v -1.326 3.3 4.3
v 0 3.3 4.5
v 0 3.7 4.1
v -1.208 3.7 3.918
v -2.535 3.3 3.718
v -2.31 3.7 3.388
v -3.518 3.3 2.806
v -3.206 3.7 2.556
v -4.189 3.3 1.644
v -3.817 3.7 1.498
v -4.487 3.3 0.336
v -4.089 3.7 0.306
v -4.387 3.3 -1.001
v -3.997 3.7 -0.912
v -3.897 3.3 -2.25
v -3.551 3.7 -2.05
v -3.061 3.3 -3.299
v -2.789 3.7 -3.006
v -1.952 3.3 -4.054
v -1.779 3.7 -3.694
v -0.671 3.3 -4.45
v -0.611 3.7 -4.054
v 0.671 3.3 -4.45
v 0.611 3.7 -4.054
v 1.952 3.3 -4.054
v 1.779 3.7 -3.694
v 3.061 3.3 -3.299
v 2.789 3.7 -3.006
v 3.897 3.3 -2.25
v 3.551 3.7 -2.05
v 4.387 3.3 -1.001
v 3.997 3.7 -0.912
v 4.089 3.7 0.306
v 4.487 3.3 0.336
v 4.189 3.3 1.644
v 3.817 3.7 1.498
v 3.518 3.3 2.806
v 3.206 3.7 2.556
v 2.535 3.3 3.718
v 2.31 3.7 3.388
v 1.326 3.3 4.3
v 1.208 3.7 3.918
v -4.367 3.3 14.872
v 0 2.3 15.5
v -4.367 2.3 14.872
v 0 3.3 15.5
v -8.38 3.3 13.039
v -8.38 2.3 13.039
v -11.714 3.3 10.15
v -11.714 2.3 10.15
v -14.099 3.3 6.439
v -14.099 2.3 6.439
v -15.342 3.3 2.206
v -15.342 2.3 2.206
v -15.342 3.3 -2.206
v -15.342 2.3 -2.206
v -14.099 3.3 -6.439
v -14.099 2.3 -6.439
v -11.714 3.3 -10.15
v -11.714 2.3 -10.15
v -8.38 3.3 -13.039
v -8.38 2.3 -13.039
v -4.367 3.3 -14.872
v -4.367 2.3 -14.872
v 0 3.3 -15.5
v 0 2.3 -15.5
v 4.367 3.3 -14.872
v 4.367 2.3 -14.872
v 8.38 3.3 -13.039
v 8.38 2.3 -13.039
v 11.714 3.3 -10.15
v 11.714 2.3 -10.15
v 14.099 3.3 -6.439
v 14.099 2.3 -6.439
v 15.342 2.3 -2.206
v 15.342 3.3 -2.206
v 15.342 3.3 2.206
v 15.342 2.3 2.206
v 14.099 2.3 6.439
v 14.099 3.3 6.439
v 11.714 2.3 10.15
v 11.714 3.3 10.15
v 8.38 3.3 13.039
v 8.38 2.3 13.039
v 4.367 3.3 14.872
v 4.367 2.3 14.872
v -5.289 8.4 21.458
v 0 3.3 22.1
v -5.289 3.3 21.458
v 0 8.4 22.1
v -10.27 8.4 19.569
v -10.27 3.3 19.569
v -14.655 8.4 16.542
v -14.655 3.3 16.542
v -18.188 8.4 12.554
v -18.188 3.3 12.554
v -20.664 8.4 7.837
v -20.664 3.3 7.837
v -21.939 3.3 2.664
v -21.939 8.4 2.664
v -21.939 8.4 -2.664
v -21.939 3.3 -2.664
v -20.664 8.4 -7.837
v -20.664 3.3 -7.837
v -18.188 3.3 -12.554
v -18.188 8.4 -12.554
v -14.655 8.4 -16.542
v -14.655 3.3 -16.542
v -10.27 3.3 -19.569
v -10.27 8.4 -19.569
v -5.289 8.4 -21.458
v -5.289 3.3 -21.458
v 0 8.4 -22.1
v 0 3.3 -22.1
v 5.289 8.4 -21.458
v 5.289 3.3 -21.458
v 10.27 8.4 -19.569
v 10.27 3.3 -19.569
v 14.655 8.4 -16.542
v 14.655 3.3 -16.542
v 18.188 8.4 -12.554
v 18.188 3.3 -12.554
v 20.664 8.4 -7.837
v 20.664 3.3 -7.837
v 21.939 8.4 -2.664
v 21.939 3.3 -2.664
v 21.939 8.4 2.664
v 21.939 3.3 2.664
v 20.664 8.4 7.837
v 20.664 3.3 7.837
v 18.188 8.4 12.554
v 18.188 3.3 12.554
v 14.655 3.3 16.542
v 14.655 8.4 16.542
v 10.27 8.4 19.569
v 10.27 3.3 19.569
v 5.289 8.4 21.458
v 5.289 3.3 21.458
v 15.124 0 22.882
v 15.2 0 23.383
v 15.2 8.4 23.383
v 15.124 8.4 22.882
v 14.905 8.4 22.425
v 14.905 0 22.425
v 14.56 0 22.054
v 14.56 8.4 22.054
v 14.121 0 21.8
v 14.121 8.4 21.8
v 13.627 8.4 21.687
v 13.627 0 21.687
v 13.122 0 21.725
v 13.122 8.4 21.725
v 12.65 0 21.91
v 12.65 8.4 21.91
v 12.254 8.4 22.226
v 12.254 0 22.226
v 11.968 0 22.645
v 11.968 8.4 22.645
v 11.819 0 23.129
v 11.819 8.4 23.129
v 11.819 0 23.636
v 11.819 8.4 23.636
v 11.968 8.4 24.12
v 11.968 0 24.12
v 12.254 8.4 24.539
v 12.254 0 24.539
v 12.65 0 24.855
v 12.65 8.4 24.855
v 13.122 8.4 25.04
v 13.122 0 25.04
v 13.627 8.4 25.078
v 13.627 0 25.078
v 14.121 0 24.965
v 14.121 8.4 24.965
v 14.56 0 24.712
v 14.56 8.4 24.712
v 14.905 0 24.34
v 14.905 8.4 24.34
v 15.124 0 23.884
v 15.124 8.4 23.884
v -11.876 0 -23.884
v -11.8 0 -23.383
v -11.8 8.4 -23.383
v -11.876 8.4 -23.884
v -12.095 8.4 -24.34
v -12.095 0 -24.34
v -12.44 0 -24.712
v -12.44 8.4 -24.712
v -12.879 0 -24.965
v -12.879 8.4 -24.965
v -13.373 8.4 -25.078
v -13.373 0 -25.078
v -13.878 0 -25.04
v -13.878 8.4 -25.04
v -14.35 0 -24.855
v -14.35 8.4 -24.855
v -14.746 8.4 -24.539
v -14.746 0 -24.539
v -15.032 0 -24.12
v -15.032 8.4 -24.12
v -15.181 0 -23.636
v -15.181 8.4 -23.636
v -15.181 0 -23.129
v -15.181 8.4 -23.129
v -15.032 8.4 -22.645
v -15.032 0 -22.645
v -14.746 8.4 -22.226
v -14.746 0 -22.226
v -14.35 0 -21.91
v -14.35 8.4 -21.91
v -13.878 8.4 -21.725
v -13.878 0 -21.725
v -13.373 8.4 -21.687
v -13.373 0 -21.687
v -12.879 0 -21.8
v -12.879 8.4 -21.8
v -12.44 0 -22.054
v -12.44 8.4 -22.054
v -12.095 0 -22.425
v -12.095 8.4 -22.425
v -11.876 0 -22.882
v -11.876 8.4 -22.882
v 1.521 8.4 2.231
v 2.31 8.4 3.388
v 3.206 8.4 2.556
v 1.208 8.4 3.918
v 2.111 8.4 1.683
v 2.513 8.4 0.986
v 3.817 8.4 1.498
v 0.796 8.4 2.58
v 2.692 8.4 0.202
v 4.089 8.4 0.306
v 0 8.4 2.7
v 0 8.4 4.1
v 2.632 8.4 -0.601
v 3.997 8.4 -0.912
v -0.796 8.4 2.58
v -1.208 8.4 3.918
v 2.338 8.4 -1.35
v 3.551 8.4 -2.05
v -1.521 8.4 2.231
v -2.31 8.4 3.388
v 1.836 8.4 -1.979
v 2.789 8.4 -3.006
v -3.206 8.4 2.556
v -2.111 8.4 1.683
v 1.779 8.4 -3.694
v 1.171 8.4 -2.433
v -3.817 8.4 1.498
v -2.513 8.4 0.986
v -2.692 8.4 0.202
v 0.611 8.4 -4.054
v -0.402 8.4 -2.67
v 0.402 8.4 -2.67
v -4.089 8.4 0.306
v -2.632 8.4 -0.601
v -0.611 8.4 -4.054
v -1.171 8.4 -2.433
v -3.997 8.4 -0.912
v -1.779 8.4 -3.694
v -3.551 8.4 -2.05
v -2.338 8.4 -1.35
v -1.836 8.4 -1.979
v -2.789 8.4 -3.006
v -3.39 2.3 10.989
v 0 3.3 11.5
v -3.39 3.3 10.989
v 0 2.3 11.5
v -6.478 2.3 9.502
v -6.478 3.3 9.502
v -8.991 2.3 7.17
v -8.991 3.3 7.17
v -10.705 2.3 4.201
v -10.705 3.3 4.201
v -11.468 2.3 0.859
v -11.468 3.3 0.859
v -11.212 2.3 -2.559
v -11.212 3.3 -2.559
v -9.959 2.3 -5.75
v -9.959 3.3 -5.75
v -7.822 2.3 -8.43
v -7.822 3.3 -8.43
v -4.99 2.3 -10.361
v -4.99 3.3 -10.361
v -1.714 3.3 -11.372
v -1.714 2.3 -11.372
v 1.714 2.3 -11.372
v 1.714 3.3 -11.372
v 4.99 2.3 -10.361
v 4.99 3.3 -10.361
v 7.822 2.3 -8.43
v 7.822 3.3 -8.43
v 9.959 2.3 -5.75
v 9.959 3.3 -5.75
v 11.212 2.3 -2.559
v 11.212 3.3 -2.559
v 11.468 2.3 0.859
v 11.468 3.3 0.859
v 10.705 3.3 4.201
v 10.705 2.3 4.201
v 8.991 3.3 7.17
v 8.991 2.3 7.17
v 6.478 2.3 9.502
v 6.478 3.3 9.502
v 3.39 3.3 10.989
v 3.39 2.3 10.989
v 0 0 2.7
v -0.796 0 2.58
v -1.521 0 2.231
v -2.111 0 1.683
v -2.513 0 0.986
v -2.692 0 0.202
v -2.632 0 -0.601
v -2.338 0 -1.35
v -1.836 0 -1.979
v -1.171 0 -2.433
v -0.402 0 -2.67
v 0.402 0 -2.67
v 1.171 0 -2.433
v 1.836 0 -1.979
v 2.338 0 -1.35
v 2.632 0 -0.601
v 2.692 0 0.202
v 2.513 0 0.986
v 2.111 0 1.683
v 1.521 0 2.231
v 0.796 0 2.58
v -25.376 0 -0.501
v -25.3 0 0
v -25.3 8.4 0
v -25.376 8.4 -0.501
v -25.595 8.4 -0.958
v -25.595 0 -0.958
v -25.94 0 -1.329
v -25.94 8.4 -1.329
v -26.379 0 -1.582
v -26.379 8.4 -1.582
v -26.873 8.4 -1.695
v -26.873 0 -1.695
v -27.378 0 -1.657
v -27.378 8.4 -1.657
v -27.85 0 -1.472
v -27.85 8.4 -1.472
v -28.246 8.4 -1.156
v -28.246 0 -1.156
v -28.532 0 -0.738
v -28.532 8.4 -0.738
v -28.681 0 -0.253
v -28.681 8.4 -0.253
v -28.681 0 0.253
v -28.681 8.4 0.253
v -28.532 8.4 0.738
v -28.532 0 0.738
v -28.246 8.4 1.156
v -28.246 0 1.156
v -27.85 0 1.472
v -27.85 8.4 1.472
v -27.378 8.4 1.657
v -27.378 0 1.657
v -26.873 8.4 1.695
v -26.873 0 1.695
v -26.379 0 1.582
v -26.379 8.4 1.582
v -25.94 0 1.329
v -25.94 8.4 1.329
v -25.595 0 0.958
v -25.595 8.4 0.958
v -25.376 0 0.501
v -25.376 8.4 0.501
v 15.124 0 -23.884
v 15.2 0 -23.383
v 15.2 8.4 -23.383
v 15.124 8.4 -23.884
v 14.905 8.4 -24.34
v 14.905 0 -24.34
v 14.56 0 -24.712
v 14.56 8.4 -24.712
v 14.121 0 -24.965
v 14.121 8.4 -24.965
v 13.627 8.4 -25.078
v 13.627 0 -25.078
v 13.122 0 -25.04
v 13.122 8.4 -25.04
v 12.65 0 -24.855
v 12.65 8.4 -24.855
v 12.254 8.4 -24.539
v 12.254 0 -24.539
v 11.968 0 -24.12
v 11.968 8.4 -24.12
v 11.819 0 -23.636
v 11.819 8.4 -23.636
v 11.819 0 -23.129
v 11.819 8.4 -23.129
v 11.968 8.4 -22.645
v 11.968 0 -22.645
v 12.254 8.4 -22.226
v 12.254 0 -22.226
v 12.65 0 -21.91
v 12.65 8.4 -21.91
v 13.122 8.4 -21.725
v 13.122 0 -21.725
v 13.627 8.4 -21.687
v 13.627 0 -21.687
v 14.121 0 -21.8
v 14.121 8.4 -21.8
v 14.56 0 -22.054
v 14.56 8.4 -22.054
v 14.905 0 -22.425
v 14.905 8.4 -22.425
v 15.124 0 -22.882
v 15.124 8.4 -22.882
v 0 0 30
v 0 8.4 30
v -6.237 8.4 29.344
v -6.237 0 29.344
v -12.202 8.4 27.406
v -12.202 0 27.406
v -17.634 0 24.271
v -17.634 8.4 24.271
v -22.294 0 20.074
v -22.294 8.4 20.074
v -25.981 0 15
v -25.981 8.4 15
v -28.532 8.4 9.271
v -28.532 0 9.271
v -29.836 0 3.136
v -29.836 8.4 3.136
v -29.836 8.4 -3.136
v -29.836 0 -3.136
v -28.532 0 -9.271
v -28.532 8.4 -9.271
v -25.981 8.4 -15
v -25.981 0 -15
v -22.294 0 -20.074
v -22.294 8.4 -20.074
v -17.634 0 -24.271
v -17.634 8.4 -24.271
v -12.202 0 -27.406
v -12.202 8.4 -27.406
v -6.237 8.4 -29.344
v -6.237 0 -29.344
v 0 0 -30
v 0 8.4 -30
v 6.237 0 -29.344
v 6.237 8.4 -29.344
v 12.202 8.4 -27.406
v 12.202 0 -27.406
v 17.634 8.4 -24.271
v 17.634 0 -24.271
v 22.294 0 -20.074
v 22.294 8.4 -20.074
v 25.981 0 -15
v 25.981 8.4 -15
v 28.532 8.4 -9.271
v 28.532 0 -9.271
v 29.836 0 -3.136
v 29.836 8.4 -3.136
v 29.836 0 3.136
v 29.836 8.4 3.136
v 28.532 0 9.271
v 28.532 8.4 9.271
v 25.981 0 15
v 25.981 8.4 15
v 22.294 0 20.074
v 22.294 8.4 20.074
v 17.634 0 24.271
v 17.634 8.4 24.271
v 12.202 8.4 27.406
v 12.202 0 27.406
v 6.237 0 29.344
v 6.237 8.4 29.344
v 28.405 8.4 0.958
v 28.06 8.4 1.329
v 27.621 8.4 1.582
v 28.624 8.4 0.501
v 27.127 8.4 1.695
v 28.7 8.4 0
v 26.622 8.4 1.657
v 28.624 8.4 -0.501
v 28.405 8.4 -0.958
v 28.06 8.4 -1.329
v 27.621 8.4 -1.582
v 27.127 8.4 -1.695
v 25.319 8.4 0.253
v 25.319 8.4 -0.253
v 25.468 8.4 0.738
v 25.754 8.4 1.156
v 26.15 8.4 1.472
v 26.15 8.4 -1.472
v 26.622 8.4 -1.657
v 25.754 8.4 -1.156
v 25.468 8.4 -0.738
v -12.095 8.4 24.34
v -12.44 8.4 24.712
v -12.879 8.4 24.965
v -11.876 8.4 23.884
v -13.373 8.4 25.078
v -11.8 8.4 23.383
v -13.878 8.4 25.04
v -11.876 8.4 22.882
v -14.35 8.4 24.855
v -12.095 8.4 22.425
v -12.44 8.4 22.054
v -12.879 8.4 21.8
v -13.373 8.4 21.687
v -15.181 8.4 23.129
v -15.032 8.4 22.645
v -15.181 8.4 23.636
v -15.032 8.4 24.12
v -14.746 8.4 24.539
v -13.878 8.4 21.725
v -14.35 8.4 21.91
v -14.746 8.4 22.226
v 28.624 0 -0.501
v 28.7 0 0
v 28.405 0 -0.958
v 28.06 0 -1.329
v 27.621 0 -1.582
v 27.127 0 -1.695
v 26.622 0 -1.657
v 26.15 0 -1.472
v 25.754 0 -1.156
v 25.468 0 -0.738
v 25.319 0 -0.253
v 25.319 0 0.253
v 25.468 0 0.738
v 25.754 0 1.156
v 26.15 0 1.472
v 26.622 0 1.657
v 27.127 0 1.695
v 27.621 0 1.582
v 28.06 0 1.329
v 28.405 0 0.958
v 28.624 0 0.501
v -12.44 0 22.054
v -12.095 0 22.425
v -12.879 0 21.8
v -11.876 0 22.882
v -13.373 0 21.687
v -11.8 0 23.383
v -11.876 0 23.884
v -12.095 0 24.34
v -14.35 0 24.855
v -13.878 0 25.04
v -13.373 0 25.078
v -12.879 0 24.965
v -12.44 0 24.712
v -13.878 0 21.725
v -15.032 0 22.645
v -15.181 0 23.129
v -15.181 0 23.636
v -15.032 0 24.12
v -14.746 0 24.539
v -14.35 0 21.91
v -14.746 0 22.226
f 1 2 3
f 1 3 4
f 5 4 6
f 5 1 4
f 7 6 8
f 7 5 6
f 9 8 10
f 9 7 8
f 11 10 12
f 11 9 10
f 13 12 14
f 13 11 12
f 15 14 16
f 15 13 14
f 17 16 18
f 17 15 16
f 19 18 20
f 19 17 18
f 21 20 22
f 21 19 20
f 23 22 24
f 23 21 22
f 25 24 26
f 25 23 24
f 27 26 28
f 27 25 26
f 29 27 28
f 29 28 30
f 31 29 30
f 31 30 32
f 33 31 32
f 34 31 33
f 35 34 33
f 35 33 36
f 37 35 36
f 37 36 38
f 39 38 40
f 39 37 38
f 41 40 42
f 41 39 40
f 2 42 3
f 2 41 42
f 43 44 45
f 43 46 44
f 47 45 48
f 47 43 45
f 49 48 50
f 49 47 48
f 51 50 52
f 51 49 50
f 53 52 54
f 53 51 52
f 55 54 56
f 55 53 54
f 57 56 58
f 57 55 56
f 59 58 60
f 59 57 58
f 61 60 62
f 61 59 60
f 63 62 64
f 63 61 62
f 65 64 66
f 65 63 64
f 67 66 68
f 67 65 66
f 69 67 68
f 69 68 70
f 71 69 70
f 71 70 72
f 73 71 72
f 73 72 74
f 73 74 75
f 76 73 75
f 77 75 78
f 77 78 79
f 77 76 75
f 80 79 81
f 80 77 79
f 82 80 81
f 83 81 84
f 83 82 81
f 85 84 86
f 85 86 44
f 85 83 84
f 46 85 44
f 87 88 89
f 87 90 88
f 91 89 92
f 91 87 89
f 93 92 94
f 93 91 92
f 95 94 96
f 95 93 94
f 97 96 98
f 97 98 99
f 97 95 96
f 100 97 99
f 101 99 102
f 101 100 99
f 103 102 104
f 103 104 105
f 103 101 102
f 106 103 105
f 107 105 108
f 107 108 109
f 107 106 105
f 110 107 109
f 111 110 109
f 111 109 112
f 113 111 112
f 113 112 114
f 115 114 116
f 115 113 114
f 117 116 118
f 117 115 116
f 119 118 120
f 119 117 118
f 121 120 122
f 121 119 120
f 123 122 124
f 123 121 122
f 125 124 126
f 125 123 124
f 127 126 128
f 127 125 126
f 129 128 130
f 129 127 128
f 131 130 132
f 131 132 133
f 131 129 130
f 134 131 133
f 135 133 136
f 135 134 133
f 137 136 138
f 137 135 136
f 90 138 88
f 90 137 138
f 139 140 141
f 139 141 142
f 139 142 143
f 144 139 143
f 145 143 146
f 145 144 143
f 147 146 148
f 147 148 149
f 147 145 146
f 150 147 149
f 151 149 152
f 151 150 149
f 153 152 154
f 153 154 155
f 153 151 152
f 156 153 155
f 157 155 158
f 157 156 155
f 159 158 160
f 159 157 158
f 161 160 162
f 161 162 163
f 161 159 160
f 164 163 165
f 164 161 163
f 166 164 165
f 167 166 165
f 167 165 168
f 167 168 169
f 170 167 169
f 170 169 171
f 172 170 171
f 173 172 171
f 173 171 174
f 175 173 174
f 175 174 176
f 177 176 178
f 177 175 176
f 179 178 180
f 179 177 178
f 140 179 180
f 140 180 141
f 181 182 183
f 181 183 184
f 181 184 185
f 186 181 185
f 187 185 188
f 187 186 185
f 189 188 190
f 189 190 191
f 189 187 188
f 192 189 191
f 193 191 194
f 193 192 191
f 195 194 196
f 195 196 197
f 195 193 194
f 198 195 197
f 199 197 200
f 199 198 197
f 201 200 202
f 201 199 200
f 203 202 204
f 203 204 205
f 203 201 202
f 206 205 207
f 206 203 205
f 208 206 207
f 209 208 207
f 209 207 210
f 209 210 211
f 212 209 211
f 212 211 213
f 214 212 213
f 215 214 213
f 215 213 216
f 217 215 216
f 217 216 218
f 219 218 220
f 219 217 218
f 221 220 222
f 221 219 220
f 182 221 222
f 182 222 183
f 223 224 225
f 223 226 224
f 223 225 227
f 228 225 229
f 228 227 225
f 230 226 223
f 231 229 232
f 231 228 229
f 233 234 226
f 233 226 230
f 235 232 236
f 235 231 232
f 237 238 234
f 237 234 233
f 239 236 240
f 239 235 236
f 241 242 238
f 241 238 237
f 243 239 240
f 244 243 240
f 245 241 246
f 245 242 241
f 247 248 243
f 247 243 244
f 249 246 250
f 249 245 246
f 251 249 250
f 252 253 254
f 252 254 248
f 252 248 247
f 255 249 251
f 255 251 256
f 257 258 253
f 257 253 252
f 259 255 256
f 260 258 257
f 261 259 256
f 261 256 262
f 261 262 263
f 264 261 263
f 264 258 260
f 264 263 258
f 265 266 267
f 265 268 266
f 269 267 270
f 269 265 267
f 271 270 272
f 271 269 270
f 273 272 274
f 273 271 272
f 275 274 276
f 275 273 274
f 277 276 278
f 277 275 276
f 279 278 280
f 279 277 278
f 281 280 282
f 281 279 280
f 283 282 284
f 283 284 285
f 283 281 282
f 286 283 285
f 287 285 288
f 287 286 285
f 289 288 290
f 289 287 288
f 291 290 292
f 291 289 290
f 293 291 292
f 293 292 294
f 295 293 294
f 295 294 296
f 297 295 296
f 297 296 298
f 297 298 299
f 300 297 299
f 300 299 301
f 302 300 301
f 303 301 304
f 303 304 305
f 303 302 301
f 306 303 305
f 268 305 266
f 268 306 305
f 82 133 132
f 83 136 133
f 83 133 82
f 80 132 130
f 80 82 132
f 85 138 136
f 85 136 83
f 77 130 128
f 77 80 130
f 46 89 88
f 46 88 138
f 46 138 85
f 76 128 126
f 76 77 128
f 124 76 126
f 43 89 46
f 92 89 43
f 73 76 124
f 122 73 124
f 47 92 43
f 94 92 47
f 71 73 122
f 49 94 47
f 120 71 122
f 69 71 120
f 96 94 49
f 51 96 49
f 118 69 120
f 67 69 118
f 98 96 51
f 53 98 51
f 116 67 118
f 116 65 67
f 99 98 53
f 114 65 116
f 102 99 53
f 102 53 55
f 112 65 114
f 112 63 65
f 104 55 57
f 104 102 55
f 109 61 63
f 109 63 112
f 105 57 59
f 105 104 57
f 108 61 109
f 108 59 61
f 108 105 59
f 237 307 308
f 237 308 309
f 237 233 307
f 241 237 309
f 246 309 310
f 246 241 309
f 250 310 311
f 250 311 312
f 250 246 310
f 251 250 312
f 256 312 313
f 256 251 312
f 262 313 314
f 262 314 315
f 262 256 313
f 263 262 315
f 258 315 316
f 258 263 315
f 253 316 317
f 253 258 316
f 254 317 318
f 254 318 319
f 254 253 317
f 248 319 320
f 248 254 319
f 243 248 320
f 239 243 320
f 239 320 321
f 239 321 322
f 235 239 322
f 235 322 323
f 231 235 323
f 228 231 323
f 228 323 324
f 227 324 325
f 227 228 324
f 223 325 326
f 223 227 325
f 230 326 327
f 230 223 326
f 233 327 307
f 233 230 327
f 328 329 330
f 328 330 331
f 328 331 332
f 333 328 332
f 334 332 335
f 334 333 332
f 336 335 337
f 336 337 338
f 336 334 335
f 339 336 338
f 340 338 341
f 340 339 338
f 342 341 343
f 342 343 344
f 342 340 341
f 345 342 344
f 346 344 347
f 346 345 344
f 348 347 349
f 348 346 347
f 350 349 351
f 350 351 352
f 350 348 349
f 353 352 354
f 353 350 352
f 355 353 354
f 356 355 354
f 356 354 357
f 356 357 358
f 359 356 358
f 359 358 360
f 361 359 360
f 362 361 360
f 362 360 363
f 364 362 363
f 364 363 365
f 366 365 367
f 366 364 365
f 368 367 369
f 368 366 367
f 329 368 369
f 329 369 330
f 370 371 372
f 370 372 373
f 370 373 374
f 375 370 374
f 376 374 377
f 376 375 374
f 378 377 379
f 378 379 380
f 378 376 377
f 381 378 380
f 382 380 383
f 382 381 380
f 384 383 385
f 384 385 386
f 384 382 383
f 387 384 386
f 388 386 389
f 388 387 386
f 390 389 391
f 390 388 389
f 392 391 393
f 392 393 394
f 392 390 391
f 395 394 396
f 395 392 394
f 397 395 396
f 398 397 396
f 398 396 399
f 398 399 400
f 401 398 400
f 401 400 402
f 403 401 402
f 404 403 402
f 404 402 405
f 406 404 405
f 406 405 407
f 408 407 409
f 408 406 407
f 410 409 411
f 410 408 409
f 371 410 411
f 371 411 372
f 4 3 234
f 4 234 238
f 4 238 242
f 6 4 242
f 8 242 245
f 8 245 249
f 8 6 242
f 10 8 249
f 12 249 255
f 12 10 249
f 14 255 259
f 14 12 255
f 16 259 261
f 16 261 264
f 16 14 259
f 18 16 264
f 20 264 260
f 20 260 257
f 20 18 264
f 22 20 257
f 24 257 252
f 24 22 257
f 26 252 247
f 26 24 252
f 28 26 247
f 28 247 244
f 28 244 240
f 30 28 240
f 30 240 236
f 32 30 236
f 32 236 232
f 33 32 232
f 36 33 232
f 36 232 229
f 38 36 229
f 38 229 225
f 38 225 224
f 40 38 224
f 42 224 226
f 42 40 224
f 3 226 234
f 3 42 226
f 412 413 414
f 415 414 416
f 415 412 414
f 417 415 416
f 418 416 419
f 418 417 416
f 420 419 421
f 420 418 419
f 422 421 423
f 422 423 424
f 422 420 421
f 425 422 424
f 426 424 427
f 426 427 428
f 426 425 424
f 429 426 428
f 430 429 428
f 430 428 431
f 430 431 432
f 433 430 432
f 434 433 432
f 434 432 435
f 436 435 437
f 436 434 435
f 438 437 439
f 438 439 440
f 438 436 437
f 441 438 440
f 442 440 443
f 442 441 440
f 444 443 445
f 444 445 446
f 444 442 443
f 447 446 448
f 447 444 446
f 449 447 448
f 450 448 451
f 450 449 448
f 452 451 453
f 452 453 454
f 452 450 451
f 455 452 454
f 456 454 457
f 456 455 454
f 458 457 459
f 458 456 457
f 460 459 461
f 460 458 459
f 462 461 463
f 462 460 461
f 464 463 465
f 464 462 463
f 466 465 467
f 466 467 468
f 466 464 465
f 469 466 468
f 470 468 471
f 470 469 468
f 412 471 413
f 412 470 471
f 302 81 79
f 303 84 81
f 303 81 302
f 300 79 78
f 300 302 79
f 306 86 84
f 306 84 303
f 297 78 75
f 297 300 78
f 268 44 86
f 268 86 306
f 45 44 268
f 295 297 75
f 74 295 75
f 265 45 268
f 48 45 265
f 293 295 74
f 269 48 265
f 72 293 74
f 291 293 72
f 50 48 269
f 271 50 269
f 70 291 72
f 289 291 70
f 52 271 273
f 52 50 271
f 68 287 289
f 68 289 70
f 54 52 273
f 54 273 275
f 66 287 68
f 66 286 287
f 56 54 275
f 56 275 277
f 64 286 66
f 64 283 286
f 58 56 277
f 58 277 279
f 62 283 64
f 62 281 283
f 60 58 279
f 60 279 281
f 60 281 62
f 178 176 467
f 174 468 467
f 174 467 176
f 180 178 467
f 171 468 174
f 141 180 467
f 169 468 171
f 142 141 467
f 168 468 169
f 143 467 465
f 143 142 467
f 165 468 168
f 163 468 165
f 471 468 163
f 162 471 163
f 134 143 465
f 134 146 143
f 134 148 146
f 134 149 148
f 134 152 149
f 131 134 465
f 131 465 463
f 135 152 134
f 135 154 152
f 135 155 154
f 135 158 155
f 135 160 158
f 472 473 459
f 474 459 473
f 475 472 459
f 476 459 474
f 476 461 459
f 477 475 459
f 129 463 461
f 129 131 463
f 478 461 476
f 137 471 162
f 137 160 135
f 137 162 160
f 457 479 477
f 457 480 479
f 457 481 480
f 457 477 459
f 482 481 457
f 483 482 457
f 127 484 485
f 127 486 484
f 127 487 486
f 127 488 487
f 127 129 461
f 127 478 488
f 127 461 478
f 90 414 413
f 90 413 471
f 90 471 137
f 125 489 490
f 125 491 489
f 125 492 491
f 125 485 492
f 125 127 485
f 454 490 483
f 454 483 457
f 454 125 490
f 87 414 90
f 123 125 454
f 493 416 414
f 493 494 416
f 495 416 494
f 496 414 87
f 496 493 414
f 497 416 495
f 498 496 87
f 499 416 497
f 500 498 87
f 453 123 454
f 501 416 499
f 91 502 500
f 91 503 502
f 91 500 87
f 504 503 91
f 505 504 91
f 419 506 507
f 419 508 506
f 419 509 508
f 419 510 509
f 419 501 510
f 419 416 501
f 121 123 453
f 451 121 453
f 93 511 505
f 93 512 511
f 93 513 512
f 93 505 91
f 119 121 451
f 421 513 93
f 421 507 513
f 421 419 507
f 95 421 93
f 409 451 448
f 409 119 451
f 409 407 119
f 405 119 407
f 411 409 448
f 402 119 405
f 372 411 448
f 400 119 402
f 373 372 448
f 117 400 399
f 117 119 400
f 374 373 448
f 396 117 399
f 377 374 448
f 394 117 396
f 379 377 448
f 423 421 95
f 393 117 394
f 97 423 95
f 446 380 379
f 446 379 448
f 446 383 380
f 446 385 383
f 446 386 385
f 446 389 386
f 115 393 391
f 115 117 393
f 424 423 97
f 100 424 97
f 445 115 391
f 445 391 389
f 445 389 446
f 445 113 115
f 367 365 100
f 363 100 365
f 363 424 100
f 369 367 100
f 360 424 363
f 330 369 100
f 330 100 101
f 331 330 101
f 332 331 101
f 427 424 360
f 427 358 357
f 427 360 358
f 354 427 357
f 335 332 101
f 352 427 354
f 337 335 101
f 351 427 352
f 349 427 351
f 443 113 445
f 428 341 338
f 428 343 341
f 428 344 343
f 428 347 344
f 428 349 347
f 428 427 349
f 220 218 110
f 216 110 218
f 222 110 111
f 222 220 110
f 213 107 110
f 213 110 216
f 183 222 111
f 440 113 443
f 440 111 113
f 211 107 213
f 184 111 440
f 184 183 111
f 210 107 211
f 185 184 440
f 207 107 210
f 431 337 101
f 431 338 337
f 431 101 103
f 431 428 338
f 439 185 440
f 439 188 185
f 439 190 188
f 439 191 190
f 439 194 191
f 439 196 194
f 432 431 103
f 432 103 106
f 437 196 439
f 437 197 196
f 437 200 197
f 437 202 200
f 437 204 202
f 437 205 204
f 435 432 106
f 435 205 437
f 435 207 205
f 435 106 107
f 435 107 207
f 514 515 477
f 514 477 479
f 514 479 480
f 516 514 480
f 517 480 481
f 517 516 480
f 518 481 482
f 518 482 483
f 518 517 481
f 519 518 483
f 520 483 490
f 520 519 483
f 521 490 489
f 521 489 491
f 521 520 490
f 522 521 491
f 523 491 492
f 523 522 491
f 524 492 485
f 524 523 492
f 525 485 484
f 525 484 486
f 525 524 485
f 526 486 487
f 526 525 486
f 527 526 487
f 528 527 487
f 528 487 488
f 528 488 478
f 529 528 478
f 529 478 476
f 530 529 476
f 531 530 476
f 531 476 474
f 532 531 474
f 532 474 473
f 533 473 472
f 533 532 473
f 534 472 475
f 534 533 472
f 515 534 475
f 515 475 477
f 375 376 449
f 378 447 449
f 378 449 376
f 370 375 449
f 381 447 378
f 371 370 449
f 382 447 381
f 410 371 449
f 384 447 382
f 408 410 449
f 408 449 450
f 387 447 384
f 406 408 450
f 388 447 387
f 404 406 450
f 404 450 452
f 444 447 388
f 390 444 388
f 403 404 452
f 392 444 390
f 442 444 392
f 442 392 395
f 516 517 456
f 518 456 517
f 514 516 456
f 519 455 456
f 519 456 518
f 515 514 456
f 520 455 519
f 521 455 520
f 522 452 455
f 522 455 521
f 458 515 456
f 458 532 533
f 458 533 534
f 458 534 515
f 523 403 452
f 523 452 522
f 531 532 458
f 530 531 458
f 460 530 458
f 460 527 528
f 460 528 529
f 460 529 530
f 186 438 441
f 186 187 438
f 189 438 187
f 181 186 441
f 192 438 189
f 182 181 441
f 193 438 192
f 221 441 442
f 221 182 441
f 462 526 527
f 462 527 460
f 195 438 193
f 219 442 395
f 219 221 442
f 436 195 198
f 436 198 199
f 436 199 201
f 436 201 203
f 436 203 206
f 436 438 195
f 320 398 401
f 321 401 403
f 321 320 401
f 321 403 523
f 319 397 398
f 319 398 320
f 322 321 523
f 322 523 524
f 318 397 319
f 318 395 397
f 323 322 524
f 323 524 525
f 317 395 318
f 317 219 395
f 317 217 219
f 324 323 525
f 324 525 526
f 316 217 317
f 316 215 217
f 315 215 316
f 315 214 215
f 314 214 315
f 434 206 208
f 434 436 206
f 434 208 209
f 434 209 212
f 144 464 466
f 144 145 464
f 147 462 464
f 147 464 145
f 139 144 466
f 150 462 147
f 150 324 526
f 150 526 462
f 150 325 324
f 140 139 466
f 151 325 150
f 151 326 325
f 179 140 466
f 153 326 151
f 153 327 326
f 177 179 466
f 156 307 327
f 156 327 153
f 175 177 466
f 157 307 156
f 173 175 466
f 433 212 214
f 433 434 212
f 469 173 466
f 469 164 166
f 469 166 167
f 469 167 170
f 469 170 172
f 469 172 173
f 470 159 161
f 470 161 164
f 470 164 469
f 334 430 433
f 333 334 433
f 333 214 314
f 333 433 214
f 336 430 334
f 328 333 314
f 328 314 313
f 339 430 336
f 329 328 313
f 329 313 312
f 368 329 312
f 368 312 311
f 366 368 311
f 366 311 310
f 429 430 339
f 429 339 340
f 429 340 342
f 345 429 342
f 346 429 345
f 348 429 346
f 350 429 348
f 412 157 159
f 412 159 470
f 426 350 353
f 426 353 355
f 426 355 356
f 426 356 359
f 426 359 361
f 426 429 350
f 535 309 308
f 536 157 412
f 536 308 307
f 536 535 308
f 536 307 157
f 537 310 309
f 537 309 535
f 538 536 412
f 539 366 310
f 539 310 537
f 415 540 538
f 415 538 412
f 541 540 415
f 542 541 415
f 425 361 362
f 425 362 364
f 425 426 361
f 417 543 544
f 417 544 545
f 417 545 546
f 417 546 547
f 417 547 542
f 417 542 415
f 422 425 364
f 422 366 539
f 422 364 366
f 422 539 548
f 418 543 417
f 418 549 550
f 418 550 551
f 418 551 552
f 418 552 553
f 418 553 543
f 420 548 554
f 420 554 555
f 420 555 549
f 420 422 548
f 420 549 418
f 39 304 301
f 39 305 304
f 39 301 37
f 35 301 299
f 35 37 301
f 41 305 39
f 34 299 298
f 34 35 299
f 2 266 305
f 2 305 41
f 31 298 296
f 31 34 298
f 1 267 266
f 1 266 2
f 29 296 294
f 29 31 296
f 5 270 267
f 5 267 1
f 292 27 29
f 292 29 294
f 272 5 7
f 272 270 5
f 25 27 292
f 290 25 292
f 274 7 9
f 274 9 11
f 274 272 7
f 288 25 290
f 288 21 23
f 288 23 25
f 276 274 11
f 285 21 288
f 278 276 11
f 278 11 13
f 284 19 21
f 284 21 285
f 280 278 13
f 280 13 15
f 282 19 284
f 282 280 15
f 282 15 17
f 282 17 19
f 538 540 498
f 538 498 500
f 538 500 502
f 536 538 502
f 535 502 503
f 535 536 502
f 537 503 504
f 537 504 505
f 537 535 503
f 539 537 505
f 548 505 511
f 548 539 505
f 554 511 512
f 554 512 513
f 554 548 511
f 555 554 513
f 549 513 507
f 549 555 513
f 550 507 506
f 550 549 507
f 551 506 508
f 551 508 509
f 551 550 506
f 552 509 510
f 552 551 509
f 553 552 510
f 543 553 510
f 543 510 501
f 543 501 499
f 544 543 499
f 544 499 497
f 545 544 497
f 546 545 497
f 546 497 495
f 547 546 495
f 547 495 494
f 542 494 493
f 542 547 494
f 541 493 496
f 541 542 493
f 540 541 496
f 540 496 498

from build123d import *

# Parameters (mm, degrees)
M3_CLEARANCE_HOLE1_OUTLINE_R = 1.7
M3_CLEARANCE_HOLE1_DEPTH     = 8.4
CHAMFER1_SIZE                = 0.4


# Read off the part's stored shape, not the designer's step: M3 Clearance Hole1
with BuildPart() as part:
    # Sketch1 → Revolve1 (revolve)
    with BuildSketch(Plane.XY, mode=Mode.PRIVATE) as revolve1_sk:
        Polygon((2.7, 0), (2.7, 8.4), (4.1, 8.4), (4.1, 3.3), (11.5, 3.3), (11.5, 2.3), (15.5, 2.3), (15.5, 3.3), (22.1, 3.3), (22.1, 8.4), (30, 8.4), (30, 0), align=None)
    revolve(revolve1_sk.sketch.rotate(Axis((0, 16.309231771, 0), (0, -1, 0)), 90), axis=Axis((0, 16.309231771, 0), (0, -1, 0)))

    # M3 Clearance Hole1 outline → M3 Clearance Hole1 (cut)
    with BuildSketch(Plane(origin=(0, 0, 0), x_dir=(1, 0, 0), z_dir=(0, 1, 0))):
        with Locations((13.5, -23.382685902)):
            Circle(M3_CLEARANCE_HOLE1_OUTLINE_R)
        with Locations((-13.5, -23.382685902)):
            Circle(M3_CLEARANCE_HOLE1_OUTLINE_R)
        with Locations((-27, 0)):
            Circle(M3_CLEARANCE_HOLE1_OUTLINE_R)
        with Locations((-13.5, 23.382685902)):
            Circle(M3_CLEARANCE_HOLE1_OUTLINE_R)
        with Locations((13.5, 23.382685902)):
            Circle(M3_CLEARANCE_HOLE1_OUTLINE_R)
        with Locations((27, 0)):
            Circle(M3_CLEARANCE_HOLE1_OUTLINE_R)
    extrude(amount=M3_CLEARANCE_HOLE1_DEPTH, mode=Mode.SUBTRACT)

    # Chamfer1
    chamfer1_edges = [part.edges().sort_by_distance(p)[0] for p in [
        (0, 3.3, -4.1),
    ]]
    chamfer(chamfer1_edges, length=CHAMFER1_SIZE)


solid = part.part
